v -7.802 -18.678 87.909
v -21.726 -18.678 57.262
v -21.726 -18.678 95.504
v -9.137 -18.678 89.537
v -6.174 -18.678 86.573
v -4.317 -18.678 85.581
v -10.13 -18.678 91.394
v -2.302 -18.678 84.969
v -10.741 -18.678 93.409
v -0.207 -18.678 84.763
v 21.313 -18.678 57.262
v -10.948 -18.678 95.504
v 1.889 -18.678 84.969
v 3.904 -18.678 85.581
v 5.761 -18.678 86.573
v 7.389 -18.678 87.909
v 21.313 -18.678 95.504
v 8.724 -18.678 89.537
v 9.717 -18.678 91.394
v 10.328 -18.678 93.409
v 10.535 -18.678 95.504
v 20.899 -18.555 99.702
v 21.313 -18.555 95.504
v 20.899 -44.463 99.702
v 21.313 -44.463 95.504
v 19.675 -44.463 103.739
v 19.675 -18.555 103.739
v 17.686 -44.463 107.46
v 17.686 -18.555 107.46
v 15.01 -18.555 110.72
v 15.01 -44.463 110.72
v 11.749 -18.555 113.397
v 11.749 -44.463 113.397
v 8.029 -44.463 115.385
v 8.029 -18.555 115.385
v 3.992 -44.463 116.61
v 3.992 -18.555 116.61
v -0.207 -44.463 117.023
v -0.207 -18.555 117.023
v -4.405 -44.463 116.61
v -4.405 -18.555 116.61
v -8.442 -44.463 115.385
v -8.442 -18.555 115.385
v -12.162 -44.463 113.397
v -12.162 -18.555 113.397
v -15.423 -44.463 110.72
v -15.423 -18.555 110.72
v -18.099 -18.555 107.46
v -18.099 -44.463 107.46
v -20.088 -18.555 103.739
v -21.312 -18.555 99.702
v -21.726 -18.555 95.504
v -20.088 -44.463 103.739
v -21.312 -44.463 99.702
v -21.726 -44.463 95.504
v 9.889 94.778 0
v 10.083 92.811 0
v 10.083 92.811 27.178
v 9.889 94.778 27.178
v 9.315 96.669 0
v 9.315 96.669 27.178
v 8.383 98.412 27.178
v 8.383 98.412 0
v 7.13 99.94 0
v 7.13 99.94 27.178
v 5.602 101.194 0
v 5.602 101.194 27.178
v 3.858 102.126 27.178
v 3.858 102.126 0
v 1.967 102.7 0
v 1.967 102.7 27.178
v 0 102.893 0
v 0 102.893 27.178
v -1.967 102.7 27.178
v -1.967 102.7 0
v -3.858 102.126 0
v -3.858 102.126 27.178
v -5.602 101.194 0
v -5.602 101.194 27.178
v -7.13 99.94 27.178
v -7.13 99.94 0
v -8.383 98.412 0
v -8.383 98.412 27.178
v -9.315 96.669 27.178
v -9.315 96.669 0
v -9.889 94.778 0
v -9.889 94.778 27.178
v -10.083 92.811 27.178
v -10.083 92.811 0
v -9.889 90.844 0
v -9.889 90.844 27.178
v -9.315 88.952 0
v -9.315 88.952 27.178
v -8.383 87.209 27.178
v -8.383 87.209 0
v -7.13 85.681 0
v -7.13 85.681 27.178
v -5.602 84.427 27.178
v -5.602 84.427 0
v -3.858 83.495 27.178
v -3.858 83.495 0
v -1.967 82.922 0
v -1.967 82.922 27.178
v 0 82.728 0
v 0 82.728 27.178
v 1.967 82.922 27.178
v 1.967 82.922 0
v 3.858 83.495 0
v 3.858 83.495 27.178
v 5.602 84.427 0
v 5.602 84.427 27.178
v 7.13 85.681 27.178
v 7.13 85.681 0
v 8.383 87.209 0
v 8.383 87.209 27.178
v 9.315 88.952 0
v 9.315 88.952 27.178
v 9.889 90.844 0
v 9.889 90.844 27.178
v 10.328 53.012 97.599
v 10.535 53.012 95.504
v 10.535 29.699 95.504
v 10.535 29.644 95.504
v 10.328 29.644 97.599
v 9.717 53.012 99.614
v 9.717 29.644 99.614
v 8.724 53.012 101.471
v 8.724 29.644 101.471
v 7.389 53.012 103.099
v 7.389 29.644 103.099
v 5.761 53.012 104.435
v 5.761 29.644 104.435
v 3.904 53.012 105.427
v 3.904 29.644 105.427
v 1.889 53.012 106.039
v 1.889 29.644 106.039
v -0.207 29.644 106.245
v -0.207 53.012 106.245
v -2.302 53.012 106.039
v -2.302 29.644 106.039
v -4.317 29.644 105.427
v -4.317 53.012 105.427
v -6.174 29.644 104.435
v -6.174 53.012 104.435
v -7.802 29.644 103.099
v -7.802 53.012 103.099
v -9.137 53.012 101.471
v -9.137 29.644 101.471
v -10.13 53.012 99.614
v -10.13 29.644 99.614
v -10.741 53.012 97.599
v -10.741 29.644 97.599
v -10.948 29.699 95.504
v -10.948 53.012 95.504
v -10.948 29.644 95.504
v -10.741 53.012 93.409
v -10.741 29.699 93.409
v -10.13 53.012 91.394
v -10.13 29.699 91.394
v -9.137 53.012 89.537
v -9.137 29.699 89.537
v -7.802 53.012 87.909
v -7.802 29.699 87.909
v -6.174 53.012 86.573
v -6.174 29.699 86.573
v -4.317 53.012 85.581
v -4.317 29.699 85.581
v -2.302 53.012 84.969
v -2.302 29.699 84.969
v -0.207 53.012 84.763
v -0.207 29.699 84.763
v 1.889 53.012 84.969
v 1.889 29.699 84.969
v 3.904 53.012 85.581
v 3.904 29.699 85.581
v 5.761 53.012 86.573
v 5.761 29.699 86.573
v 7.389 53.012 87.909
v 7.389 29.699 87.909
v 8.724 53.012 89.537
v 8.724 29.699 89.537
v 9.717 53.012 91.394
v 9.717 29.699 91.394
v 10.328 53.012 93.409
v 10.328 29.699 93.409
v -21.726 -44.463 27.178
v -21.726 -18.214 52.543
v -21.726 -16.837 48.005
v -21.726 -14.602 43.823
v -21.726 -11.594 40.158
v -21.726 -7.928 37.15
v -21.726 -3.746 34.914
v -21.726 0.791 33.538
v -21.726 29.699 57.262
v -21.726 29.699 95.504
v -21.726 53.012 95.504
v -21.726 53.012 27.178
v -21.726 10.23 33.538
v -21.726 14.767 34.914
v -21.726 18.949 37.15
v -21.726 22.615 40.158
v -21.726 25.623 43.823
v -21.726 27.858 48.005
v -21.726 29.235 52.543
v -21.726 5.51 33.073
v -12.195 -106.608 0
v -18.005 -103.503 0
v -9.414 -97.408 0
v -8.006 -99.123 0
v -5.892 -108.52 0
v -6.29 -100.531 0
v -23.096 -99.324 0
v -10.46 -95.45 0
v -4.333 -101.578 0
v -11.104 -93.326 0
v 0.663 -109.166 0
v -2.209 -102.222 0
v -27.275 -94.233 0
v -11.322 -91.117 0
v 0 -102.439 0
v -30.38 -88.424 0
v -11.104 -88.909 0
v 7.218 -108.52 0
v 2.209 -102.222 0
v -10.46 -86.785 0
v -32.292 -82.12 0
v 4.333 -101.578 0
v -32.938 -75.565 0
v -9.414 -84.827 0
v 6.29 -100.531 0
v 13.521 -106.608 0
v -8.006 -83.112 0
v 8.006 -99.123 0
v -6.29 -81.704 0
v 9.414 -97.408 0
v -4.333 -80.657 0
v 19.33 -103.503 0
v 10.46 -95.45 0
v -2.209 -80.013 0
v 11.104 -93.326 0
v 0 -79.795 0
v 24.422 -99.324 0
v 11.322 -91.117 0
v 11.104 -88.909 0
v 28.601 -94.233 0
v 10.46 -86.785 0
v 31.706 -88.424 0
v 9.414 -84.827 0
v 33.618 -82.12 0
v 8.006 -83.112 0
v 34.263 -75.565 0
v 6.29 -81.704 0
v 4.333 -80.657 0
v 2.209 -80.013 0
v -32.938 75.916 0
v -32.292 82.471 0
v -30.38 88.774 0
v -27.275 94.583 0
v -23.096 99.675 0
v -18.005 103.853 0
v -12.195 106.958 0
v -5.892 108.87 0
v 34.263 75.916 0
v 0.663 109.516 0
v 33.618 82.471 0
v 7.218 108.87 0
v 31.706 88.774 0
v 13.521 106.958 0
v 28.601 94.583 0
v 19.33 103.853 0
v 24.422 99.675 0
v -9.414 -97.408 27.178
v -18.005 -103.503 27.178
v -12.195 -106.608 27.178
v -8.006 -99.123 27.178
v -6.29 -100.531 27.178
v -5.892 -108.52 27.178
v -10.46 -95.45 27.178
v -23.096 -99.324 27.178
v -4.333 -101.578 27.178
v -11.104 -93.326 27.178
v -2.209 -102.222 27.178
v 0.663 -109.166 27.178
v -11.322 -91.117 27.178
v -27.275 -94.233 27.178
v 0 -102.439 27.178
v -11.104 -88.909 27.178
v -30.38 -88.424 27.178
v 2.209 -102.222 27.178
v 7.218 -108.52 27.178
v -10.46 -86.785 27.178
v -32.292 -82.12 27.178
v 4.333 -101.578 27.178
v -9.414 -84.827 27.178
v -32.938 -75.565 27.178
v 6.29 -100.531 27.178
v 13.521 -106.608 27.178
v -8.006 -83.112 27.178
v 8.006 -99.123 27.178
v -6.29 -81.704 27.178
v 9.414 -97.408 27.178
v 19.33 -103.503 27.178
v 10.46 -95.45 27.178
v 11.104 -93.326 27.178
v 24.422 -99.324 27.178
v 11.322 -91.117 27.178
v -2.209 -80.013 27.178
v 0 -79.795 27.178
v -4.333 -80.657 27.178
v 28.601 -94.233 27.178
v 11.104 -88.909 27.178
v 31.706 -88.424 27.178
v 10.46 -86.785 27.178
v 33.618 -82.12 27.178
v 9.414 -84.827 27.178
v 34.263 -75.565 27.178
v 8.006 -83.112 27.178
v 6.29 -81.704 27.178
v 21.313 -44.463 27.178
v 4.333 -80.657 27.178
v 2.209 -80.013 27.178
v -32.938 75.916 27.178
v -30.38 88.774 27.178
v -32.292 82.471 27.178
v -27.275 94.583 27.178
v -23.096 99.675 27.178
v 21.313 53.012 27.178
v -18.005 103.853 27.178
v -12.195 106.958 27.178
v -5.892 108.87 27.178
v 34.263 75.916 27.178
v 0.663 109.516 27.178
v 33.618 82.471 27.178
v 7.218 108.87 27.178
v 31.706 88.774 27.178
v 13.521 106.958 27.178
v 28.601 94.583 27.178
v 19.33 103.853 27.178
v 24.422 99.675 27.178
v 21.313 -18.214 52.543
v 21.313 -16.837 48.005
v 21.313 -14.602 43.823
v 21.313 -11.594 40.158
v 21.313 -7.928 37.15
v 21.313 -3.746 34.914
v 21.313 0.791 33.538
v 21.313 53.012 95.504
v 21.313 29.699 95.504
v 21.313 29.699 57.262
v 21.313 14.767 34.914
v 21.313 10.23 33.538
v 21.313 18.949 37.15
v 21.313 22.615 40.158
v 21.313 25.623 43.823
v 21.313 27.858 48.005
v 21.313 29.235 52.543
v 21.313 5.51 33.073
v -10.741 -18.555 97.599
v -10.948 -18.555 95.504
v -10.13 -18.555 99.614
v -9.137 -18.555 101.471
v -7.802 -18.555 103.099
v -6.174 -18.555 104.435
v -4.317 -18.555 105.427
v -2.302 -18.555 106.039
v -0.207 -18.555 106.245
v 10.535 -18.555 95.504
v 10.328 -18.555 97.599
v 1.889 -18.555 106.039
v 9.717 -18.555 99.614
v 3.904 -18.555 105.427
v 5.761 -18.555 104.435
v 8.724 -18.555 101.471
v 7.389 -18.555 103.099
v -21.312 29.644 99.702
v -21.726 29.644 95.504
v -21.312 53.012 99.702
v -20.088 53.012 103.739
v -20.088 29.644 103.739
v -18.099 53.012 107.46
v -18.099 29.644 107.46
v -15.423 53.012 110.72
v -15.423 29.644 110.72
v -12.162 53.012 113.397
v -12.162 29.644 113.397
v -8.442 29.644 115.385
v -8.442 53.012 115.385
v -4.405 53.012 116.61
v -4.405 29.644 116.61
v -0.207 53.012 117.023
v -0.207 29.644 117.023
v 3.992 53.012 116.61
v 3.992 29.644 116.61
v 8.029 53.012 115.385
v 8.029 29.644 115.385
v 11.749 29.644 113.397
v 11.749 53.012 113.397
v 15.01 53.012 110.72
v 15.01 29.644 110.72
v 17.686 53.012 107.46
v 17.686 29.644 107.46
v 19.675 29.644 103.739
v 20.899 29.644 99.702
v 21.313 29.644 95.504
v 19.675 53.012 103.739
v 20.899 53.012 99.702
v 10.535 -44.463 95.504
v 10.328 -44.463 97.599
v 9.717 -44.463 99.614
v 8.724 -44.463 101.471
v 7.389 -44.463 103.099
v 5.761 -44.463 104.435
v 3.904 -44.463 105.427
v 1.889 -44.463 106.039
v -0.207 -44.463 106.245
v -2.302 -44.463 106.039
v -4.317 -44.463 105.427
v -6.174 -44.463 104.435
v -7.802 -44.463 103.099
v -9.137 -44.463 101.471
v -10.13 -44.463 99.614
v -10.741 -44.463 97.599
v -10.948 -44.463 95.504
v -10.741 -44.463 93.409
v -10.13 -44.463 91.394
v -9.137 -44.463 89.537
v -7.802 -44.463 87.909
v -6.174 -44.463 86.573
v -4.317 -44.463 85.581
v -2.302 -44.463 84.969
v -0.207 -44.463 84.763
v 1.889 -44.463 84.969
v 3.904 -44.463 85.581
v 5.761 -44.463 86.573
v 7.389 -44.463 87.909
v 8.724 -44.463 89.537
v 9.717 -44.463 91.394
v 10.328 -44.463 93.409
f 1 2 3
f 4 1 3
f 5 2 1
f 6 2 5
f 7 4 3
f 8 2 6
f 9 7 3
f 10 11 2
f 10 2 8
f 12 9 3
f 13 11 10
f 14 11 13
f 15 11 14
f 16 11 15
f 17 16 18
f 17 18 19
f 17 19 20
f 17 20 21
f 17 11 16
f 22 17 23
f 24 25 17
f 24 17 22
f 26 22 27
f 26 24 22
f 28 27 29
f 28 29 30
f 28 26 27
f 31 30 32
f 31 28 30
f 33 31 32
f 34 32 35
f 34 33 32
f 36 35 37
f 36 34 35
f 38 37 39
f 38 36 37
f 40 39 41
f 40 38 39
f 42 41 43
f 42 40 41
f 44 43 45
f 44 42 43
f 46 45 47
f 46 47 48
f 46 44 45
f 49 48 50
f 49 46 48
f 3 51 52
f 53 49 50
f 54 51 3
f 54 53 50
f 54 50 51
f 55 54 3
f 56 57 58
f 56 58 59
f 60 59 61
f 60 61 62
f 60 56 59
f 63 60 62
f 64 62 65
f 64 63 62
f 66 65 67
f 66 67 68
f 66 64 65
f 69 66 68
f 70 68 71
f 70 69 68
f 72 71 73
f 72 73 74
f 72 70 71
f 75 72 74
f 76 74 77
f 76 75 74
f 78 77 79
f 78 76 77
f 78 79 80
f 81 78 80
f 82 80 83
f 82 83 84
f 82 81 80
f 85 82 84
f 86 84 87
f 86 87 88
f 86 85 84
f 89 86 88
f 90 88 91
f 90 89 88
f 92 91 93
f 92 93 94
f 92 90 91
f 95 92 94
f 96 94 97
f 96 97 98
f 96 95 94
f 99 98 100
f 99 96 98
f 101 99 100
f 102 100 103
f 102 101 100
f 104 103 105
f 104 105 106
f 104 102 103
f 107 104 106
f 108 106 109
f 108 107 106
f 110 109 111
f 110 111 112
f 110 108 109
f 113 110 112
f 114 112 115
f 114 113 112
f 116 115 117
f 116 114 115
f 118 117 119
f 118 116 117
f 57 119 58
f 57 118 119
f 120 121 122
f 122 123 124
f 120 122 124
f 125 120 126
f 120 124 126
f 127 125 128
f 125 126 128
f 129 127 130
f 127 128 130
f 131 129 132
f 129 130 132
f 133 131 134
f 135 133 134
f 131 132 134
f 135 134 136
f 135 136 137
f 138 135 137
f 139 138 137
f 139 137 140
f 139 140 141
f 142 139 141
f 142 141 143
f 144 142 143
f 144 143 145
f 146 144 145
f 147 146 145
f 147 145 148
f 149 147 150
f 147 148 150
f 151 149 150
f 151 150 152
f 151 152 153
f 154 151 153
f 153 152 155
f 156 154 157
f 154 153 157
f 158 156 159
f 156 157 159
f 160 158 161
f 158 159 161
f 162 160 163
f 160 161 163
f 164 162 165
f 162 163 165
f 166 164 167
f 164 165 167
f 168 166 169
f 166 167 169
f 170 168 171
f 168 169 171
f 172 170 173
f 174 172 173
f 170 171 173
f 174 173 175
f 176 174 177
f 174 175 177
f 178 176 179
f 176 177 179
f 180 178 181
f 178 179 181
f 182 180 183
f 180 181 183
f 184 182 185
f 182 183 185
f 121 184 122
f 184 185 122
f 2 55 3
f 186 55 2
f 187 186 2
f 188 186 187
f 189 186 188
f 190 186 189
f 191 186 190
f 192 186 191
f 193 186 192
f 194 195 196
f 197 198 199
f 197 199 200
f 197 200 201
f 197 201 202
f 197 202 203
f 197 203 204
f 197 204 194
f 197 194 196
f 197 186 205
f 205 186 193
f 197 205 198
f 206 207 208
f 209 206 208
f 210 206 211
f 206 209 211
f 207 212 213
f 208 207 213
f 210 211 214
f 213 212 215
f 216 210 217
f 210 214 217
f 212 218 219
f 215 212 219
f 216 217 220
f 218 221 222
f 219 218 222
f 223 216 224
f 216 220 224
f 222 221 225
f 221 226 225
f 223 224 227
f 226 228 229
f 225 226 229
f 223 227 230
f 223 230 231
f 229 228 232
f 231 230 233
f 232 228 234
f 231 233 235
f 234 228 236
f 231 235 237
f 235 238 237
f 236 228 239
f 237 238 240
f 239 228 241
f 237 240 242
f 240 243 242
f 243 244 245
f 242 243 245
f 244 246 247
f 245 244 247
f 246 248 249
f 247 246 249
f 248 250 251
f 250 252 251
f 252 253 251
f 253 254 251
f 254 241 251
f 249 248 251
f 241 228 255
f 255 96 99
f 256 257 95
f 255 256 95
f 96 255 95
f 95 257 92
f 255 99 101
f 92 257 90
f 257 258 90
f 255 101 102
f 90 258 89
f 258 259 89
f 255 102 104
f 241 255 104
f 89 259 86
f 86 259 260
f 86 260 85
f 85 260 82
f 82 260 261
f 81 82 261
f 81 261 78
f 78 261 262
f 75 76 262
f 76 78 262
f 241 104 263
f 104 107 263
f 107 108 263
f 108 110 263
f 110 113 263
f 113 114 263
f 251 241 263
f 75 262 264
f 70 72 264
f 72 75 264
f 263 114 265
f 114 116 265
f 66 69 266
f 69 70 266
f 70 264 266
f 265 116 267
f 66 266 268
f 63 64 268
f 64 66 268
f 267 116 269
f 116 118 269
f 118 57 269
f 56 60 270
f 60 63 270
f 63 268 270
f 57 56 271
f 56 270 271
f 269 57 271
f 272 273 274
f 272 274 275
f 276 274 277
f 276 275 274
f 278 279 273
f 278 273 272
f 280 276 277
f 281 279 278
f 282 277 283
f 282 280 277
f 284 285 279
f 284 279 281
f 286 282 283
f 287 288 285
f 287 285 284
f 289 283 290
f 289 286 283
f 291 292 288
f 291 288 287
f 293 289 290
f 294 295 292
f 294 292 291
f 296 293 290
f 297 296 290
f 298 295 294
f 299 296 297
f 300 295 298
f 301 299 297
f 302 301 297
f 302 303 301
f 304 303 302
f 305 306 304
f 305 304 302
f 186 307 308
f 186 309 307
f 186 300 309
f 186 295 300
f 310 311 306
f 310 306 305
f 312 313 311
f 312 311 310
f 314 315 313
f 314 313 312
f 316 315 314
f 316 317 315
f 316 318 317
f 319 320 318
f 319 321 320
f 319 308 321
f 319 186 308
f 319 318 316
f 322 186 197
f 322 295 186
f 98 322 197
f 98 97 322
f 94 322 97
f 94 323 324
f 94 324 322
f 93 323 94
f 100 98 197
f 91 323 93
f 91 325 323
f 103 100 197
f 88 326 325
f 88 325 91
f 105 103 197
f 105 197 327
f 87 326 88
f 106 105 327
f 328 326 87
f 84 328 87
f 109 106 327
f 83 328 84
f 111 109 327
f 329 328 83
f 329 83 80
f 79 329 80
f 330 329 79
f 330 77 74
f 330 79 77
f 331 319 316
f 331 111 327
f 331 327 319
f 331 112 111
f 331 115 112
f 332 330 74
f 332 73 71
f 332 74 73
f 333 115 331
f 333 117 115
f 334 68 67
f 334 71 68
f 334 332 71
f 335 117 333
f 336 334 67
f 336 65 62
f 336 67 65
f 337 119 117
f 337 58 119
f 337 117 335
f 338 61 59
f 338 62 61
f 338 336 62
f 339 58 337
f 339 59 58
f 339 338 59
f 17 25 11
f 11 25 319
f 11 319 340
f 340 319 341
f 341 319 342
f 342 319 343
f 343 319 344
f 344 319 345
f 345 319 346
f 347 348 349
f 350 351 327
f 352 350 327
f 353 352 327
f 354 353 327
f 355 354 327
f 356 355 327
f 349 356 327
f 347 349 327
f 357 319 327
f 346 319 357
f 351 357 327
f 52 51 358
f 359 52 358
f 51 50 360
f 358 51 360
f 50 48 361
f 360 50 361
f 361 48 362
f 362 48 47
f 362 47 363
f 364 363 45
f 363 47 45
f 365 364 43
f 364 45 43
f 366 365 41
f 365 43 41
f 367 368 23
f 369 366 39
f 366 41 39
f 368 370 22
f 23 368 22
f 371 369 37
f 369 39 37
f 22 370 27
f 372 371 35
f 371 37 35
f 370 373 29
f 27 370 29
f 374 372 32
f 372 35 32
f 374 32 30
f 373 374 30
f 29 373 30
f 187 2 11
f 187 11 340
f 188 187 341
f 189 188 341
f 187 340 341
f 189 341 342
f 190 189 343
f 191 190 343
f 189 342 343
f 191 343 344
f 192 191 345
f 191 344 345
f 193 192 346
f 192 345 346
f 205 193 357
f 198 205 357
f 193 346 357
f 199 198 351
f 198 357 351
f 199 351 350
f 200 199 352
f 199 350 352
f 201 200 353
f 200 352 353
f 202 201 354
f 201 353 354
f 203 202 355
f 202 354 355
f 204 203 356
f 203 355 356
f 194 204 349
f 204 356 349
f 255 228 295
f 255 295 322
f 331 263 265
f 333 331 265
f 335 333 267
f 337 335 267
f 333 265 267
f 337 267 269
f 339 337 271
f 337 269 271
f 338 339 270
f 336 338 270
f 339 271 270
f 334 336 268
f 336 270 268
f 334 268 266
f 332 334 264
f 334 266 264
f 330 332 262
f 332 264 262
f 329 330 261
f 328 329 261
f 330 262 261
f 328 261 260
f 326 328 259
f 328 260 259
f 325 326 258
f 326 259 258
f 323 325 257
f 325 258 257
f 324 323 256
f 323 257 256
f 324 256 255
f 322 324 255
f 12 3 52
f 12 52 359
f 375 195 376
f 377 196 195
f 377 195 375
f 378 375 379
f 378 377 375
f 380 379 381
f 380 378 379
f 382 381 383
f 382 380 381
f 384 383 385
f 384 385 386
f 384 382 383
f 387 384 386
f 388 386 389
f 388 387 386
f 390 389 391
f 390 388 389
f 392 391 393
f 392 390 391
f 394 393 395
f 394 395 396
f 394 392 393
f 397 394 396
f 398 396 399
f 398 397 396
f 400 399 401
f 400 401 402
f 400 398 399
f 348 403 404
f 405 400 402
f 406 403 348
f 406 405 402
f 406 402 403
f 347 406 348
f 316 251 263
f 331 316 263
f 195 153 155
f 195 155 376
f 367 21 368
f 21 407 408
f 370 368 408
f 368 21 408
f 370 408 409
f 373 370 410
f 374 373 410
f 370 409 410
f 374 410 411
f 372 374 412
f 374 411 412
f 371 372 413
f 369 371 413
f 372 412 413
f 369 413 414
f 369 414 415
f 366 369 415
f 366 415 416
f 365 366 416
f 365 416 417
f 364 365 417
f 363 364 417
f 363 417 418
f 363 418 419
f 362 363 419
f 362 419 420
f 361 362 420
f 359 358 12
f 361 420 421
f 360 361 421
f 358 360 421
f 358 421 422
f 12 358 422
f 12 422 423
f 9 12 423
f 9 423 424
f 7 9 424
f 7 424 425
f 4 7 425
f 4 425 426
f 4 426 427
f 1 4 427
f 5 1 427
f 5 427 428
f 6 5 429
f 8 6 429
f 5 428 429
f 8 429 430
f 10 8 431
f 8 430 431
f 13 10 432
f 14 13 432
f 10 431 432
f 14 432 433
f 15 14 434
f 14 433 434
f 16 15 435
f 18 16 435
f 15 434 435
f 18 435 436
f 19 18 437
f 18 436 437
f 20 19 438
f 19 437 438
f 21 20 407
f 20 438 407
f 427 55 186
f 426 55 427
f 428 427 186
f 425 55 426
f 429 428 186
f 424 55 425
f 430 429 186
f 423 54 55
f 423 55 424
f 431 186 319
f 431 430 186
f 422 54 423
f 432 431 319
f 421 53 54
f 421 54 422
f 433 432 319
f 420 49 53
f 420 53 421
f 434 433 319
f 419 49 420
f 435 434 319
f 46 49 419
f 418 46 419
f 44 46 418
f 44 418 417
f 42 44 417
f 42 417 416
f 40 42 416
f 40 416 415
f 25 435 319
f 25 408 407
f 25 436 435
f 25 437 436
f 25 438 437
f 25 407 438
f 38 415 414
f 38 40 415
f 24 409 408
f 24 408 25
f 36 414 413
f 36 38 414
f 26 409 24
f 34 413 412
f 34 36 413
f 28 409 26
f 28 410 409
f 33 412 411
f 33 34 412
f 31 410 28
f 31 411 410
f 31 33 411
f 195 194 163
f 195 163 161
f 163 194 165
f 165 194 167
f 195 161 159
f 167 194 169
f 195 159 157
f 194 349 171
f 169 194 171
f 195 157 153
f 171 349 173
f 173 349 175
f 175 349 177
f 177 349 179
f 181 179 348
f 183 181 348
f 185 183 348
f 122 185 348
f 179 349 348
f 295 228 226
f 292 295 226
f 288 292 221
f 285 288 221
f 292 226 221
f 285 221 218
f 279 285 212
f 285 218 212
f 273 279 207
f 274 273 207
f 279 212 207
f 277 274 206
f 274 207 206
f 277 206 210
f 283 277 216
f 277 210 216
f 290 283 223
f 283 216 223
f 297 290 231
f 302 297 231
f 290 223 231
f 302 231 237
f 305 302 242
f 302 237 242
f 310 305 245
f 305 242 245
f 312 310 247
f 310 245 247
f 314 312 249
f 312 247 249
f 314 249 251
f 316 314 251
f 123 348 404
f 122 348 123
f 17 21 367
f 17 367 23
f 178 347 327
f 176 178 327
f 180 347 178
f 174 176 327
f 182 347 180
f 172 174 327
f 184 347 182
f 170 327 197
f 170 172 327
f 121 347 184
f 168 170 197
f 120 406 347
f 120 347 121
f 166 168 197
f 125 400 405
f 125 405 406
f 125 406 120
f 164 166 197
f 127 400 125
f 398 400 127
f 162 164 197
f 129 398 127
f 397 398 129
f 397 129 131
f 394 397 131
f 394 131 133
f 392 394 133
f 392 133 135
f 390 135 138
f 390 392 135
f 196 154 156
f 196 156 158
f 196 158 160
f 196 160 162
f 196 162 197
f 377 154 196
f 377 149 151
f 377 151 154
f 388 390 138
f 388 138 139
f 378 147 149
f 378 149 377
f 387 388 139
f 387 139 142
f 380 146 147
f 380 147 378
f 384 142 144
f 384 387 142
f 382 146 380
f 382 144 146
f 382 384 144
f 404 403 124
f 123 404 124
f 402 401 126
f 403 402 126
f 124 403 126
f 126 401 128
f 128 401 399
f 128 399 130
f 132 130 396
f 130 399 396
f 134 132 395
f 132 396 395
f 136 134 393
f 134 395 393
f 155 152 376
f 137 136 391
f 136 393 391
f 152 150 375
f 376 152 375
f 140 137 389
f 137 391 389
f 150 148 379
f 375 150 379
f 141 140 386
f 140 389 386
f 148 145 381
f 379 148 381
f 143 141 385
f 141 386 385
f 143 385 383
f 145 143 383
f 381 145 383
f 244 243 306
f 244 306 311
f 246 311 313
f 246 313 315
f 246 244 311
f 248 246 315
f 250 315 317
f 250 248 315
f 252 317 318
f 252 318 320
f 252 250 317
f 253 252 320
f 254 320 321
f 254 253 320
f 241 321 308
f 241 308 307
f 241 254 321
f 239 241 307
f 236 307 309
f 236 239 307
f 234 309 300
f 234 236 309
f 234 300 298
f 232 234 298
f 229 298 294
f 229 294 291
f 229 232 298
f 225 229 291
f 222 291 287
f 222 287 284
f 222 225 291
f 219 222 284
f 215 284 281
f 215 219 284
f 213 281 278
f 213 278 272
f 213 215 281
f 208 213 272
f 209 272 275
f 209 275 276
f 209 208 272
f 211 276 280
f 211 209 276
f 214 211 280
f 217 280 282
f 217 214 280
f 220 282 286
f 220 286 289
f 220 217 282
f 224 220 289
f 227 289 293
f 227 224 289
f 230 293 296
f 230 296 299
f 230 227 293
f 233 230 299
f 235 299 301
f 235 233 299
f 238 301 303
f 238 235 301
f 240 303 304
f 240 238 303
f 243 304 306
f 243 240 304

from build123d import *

# Parameters (mm, degrees)
F0_W      = 67.2008618712
F0_H      = 151.4808684587
F0_R      = 10.082645717
F0_R_2    = 11.3219801377
F1_DEPTH  = 27.178
F2_W      = 43.0387500674
F2_H      = 97.4754467607
F3_DEPTH  = 68.326
F4_W      = 48.377899453
F4_H      = 38.2418624678
F5_DEPTH  = 120.904
F7_DEPTH  = 22.352
F8_DEPTH  = 1.016
F10_DEPTH = 25.908
F11_R     = 10.7410584699
F12_DEPTH = 138.938


with BuildPart() as f1:
    # F0 (on Top) → F1 (new body)
    with BuildSketch(Plane.XY):
        with Locations((0.662881881, 0.175178051)):
            Rectangle(F0_W, F0_H)
        with BuildLine():
            ThreePointArc((34.2633128166, 75.9156122804), (0.662881881, 109.516043216), (-32.9375490546, 75.9156122804))
            Line((-32.9375490546, 75.9156122804), (34.2633128166, 75.9156122804))
        make_face()
        with Locations((0, 92.8106307983)):
            Circle(F0_R, mode=Mode.SUBTRACT)
        with BuildLine():
            Line((34.2633128166, -75.5652561784), (-32.9375490546, -75.5652561784))
            ThreePointArc((-32.9375490546, -75.5652561784), (0.662881881, -109.165687114), (34.2633128166, -75.5652561784))
        make_face()
        with Locations((0, -91.1173969507)):
            Circle(F0_R_2, mode=Mode.SUBTRACT)
    extrude(amount=F1_DEPTH)

    # F2 (on face) → F3 (join)
    with BuildSketch(Plane.XY.offset(27.178)):
        with Locations((-0.206517987, 4.2744092643)):
            Rectangle(F2_W, F2_H)
    extrude(amount=F3_DEPTH)

    # F4 (on face) → F5 (cut)
    with BuildSketch(Plane.YZ.offset(21.3128570467)):
        with Locations((5.5104782805, 76.3830687661)):
            Rectangle(F4_W, F4_H)
        with BuildLine():
            Line((29.699428007, 57.2621375322), (-18.678471446, 57.2621375322))
            ThreePointArc((-18.678471446, 57.2621375322), (5.5104782805, 33.0731878057), (29.699428007, 57.2621375322))
        make_face()
    extrude(amount=-F5_DEPTH, mode=Mode.SUBTRACT)

    # F6 (on face) → F7 (join)
    with BuildSketch(Plane(origin=(0, 53.0121326447, 0), x_dir=(-1, 0, 0), z_dir=(0, 1, 0))):
        with BuildLine():
            Line((-21.3128570467, 95.504), (21.7258930206, 95.504))
            ThreePointArc((21.7258930206, 95.504), (0.206517987, 117.0233750337), (-21.3128570467, 95.504))
        make_face()
    extrude(amount=-F7_DEPTH)

    # F8 (add): a face of the model
    f8_faces = [f1.faces().sort_by_distance(p)[0] for p in [
        (-0.206517987, 30.6601326447, 104.6371064236),
    ]]
    extrude(f8_faces, amount=F8_DEPTH)

    # F9 (on face) → F10 (join)
    with BuildSketch(Plane.XZ.offset(44.463314116)):
        with BuildLine():
            Line((-21.7258930206, 95.504), (21.3128570467, 95.504))
            ThreePointArc((21.3128570467, 95.504), (-0.206517987, 117.0233750337), (-21.7258930206, 95.504))
        make_face()
    extrude(amount=-F10_DEPTH)

    # F11 (on face) → F12 (cut)
    with BuildSketch(Plane.XZ.offset(44.463314116)):
        with Locations((-0.206517987, 95.504)):
            Circle(F11_R)
    extrude(amount=-F12_DEPTH, mode=Mode.SUBTRACT)


solid = f1.part
